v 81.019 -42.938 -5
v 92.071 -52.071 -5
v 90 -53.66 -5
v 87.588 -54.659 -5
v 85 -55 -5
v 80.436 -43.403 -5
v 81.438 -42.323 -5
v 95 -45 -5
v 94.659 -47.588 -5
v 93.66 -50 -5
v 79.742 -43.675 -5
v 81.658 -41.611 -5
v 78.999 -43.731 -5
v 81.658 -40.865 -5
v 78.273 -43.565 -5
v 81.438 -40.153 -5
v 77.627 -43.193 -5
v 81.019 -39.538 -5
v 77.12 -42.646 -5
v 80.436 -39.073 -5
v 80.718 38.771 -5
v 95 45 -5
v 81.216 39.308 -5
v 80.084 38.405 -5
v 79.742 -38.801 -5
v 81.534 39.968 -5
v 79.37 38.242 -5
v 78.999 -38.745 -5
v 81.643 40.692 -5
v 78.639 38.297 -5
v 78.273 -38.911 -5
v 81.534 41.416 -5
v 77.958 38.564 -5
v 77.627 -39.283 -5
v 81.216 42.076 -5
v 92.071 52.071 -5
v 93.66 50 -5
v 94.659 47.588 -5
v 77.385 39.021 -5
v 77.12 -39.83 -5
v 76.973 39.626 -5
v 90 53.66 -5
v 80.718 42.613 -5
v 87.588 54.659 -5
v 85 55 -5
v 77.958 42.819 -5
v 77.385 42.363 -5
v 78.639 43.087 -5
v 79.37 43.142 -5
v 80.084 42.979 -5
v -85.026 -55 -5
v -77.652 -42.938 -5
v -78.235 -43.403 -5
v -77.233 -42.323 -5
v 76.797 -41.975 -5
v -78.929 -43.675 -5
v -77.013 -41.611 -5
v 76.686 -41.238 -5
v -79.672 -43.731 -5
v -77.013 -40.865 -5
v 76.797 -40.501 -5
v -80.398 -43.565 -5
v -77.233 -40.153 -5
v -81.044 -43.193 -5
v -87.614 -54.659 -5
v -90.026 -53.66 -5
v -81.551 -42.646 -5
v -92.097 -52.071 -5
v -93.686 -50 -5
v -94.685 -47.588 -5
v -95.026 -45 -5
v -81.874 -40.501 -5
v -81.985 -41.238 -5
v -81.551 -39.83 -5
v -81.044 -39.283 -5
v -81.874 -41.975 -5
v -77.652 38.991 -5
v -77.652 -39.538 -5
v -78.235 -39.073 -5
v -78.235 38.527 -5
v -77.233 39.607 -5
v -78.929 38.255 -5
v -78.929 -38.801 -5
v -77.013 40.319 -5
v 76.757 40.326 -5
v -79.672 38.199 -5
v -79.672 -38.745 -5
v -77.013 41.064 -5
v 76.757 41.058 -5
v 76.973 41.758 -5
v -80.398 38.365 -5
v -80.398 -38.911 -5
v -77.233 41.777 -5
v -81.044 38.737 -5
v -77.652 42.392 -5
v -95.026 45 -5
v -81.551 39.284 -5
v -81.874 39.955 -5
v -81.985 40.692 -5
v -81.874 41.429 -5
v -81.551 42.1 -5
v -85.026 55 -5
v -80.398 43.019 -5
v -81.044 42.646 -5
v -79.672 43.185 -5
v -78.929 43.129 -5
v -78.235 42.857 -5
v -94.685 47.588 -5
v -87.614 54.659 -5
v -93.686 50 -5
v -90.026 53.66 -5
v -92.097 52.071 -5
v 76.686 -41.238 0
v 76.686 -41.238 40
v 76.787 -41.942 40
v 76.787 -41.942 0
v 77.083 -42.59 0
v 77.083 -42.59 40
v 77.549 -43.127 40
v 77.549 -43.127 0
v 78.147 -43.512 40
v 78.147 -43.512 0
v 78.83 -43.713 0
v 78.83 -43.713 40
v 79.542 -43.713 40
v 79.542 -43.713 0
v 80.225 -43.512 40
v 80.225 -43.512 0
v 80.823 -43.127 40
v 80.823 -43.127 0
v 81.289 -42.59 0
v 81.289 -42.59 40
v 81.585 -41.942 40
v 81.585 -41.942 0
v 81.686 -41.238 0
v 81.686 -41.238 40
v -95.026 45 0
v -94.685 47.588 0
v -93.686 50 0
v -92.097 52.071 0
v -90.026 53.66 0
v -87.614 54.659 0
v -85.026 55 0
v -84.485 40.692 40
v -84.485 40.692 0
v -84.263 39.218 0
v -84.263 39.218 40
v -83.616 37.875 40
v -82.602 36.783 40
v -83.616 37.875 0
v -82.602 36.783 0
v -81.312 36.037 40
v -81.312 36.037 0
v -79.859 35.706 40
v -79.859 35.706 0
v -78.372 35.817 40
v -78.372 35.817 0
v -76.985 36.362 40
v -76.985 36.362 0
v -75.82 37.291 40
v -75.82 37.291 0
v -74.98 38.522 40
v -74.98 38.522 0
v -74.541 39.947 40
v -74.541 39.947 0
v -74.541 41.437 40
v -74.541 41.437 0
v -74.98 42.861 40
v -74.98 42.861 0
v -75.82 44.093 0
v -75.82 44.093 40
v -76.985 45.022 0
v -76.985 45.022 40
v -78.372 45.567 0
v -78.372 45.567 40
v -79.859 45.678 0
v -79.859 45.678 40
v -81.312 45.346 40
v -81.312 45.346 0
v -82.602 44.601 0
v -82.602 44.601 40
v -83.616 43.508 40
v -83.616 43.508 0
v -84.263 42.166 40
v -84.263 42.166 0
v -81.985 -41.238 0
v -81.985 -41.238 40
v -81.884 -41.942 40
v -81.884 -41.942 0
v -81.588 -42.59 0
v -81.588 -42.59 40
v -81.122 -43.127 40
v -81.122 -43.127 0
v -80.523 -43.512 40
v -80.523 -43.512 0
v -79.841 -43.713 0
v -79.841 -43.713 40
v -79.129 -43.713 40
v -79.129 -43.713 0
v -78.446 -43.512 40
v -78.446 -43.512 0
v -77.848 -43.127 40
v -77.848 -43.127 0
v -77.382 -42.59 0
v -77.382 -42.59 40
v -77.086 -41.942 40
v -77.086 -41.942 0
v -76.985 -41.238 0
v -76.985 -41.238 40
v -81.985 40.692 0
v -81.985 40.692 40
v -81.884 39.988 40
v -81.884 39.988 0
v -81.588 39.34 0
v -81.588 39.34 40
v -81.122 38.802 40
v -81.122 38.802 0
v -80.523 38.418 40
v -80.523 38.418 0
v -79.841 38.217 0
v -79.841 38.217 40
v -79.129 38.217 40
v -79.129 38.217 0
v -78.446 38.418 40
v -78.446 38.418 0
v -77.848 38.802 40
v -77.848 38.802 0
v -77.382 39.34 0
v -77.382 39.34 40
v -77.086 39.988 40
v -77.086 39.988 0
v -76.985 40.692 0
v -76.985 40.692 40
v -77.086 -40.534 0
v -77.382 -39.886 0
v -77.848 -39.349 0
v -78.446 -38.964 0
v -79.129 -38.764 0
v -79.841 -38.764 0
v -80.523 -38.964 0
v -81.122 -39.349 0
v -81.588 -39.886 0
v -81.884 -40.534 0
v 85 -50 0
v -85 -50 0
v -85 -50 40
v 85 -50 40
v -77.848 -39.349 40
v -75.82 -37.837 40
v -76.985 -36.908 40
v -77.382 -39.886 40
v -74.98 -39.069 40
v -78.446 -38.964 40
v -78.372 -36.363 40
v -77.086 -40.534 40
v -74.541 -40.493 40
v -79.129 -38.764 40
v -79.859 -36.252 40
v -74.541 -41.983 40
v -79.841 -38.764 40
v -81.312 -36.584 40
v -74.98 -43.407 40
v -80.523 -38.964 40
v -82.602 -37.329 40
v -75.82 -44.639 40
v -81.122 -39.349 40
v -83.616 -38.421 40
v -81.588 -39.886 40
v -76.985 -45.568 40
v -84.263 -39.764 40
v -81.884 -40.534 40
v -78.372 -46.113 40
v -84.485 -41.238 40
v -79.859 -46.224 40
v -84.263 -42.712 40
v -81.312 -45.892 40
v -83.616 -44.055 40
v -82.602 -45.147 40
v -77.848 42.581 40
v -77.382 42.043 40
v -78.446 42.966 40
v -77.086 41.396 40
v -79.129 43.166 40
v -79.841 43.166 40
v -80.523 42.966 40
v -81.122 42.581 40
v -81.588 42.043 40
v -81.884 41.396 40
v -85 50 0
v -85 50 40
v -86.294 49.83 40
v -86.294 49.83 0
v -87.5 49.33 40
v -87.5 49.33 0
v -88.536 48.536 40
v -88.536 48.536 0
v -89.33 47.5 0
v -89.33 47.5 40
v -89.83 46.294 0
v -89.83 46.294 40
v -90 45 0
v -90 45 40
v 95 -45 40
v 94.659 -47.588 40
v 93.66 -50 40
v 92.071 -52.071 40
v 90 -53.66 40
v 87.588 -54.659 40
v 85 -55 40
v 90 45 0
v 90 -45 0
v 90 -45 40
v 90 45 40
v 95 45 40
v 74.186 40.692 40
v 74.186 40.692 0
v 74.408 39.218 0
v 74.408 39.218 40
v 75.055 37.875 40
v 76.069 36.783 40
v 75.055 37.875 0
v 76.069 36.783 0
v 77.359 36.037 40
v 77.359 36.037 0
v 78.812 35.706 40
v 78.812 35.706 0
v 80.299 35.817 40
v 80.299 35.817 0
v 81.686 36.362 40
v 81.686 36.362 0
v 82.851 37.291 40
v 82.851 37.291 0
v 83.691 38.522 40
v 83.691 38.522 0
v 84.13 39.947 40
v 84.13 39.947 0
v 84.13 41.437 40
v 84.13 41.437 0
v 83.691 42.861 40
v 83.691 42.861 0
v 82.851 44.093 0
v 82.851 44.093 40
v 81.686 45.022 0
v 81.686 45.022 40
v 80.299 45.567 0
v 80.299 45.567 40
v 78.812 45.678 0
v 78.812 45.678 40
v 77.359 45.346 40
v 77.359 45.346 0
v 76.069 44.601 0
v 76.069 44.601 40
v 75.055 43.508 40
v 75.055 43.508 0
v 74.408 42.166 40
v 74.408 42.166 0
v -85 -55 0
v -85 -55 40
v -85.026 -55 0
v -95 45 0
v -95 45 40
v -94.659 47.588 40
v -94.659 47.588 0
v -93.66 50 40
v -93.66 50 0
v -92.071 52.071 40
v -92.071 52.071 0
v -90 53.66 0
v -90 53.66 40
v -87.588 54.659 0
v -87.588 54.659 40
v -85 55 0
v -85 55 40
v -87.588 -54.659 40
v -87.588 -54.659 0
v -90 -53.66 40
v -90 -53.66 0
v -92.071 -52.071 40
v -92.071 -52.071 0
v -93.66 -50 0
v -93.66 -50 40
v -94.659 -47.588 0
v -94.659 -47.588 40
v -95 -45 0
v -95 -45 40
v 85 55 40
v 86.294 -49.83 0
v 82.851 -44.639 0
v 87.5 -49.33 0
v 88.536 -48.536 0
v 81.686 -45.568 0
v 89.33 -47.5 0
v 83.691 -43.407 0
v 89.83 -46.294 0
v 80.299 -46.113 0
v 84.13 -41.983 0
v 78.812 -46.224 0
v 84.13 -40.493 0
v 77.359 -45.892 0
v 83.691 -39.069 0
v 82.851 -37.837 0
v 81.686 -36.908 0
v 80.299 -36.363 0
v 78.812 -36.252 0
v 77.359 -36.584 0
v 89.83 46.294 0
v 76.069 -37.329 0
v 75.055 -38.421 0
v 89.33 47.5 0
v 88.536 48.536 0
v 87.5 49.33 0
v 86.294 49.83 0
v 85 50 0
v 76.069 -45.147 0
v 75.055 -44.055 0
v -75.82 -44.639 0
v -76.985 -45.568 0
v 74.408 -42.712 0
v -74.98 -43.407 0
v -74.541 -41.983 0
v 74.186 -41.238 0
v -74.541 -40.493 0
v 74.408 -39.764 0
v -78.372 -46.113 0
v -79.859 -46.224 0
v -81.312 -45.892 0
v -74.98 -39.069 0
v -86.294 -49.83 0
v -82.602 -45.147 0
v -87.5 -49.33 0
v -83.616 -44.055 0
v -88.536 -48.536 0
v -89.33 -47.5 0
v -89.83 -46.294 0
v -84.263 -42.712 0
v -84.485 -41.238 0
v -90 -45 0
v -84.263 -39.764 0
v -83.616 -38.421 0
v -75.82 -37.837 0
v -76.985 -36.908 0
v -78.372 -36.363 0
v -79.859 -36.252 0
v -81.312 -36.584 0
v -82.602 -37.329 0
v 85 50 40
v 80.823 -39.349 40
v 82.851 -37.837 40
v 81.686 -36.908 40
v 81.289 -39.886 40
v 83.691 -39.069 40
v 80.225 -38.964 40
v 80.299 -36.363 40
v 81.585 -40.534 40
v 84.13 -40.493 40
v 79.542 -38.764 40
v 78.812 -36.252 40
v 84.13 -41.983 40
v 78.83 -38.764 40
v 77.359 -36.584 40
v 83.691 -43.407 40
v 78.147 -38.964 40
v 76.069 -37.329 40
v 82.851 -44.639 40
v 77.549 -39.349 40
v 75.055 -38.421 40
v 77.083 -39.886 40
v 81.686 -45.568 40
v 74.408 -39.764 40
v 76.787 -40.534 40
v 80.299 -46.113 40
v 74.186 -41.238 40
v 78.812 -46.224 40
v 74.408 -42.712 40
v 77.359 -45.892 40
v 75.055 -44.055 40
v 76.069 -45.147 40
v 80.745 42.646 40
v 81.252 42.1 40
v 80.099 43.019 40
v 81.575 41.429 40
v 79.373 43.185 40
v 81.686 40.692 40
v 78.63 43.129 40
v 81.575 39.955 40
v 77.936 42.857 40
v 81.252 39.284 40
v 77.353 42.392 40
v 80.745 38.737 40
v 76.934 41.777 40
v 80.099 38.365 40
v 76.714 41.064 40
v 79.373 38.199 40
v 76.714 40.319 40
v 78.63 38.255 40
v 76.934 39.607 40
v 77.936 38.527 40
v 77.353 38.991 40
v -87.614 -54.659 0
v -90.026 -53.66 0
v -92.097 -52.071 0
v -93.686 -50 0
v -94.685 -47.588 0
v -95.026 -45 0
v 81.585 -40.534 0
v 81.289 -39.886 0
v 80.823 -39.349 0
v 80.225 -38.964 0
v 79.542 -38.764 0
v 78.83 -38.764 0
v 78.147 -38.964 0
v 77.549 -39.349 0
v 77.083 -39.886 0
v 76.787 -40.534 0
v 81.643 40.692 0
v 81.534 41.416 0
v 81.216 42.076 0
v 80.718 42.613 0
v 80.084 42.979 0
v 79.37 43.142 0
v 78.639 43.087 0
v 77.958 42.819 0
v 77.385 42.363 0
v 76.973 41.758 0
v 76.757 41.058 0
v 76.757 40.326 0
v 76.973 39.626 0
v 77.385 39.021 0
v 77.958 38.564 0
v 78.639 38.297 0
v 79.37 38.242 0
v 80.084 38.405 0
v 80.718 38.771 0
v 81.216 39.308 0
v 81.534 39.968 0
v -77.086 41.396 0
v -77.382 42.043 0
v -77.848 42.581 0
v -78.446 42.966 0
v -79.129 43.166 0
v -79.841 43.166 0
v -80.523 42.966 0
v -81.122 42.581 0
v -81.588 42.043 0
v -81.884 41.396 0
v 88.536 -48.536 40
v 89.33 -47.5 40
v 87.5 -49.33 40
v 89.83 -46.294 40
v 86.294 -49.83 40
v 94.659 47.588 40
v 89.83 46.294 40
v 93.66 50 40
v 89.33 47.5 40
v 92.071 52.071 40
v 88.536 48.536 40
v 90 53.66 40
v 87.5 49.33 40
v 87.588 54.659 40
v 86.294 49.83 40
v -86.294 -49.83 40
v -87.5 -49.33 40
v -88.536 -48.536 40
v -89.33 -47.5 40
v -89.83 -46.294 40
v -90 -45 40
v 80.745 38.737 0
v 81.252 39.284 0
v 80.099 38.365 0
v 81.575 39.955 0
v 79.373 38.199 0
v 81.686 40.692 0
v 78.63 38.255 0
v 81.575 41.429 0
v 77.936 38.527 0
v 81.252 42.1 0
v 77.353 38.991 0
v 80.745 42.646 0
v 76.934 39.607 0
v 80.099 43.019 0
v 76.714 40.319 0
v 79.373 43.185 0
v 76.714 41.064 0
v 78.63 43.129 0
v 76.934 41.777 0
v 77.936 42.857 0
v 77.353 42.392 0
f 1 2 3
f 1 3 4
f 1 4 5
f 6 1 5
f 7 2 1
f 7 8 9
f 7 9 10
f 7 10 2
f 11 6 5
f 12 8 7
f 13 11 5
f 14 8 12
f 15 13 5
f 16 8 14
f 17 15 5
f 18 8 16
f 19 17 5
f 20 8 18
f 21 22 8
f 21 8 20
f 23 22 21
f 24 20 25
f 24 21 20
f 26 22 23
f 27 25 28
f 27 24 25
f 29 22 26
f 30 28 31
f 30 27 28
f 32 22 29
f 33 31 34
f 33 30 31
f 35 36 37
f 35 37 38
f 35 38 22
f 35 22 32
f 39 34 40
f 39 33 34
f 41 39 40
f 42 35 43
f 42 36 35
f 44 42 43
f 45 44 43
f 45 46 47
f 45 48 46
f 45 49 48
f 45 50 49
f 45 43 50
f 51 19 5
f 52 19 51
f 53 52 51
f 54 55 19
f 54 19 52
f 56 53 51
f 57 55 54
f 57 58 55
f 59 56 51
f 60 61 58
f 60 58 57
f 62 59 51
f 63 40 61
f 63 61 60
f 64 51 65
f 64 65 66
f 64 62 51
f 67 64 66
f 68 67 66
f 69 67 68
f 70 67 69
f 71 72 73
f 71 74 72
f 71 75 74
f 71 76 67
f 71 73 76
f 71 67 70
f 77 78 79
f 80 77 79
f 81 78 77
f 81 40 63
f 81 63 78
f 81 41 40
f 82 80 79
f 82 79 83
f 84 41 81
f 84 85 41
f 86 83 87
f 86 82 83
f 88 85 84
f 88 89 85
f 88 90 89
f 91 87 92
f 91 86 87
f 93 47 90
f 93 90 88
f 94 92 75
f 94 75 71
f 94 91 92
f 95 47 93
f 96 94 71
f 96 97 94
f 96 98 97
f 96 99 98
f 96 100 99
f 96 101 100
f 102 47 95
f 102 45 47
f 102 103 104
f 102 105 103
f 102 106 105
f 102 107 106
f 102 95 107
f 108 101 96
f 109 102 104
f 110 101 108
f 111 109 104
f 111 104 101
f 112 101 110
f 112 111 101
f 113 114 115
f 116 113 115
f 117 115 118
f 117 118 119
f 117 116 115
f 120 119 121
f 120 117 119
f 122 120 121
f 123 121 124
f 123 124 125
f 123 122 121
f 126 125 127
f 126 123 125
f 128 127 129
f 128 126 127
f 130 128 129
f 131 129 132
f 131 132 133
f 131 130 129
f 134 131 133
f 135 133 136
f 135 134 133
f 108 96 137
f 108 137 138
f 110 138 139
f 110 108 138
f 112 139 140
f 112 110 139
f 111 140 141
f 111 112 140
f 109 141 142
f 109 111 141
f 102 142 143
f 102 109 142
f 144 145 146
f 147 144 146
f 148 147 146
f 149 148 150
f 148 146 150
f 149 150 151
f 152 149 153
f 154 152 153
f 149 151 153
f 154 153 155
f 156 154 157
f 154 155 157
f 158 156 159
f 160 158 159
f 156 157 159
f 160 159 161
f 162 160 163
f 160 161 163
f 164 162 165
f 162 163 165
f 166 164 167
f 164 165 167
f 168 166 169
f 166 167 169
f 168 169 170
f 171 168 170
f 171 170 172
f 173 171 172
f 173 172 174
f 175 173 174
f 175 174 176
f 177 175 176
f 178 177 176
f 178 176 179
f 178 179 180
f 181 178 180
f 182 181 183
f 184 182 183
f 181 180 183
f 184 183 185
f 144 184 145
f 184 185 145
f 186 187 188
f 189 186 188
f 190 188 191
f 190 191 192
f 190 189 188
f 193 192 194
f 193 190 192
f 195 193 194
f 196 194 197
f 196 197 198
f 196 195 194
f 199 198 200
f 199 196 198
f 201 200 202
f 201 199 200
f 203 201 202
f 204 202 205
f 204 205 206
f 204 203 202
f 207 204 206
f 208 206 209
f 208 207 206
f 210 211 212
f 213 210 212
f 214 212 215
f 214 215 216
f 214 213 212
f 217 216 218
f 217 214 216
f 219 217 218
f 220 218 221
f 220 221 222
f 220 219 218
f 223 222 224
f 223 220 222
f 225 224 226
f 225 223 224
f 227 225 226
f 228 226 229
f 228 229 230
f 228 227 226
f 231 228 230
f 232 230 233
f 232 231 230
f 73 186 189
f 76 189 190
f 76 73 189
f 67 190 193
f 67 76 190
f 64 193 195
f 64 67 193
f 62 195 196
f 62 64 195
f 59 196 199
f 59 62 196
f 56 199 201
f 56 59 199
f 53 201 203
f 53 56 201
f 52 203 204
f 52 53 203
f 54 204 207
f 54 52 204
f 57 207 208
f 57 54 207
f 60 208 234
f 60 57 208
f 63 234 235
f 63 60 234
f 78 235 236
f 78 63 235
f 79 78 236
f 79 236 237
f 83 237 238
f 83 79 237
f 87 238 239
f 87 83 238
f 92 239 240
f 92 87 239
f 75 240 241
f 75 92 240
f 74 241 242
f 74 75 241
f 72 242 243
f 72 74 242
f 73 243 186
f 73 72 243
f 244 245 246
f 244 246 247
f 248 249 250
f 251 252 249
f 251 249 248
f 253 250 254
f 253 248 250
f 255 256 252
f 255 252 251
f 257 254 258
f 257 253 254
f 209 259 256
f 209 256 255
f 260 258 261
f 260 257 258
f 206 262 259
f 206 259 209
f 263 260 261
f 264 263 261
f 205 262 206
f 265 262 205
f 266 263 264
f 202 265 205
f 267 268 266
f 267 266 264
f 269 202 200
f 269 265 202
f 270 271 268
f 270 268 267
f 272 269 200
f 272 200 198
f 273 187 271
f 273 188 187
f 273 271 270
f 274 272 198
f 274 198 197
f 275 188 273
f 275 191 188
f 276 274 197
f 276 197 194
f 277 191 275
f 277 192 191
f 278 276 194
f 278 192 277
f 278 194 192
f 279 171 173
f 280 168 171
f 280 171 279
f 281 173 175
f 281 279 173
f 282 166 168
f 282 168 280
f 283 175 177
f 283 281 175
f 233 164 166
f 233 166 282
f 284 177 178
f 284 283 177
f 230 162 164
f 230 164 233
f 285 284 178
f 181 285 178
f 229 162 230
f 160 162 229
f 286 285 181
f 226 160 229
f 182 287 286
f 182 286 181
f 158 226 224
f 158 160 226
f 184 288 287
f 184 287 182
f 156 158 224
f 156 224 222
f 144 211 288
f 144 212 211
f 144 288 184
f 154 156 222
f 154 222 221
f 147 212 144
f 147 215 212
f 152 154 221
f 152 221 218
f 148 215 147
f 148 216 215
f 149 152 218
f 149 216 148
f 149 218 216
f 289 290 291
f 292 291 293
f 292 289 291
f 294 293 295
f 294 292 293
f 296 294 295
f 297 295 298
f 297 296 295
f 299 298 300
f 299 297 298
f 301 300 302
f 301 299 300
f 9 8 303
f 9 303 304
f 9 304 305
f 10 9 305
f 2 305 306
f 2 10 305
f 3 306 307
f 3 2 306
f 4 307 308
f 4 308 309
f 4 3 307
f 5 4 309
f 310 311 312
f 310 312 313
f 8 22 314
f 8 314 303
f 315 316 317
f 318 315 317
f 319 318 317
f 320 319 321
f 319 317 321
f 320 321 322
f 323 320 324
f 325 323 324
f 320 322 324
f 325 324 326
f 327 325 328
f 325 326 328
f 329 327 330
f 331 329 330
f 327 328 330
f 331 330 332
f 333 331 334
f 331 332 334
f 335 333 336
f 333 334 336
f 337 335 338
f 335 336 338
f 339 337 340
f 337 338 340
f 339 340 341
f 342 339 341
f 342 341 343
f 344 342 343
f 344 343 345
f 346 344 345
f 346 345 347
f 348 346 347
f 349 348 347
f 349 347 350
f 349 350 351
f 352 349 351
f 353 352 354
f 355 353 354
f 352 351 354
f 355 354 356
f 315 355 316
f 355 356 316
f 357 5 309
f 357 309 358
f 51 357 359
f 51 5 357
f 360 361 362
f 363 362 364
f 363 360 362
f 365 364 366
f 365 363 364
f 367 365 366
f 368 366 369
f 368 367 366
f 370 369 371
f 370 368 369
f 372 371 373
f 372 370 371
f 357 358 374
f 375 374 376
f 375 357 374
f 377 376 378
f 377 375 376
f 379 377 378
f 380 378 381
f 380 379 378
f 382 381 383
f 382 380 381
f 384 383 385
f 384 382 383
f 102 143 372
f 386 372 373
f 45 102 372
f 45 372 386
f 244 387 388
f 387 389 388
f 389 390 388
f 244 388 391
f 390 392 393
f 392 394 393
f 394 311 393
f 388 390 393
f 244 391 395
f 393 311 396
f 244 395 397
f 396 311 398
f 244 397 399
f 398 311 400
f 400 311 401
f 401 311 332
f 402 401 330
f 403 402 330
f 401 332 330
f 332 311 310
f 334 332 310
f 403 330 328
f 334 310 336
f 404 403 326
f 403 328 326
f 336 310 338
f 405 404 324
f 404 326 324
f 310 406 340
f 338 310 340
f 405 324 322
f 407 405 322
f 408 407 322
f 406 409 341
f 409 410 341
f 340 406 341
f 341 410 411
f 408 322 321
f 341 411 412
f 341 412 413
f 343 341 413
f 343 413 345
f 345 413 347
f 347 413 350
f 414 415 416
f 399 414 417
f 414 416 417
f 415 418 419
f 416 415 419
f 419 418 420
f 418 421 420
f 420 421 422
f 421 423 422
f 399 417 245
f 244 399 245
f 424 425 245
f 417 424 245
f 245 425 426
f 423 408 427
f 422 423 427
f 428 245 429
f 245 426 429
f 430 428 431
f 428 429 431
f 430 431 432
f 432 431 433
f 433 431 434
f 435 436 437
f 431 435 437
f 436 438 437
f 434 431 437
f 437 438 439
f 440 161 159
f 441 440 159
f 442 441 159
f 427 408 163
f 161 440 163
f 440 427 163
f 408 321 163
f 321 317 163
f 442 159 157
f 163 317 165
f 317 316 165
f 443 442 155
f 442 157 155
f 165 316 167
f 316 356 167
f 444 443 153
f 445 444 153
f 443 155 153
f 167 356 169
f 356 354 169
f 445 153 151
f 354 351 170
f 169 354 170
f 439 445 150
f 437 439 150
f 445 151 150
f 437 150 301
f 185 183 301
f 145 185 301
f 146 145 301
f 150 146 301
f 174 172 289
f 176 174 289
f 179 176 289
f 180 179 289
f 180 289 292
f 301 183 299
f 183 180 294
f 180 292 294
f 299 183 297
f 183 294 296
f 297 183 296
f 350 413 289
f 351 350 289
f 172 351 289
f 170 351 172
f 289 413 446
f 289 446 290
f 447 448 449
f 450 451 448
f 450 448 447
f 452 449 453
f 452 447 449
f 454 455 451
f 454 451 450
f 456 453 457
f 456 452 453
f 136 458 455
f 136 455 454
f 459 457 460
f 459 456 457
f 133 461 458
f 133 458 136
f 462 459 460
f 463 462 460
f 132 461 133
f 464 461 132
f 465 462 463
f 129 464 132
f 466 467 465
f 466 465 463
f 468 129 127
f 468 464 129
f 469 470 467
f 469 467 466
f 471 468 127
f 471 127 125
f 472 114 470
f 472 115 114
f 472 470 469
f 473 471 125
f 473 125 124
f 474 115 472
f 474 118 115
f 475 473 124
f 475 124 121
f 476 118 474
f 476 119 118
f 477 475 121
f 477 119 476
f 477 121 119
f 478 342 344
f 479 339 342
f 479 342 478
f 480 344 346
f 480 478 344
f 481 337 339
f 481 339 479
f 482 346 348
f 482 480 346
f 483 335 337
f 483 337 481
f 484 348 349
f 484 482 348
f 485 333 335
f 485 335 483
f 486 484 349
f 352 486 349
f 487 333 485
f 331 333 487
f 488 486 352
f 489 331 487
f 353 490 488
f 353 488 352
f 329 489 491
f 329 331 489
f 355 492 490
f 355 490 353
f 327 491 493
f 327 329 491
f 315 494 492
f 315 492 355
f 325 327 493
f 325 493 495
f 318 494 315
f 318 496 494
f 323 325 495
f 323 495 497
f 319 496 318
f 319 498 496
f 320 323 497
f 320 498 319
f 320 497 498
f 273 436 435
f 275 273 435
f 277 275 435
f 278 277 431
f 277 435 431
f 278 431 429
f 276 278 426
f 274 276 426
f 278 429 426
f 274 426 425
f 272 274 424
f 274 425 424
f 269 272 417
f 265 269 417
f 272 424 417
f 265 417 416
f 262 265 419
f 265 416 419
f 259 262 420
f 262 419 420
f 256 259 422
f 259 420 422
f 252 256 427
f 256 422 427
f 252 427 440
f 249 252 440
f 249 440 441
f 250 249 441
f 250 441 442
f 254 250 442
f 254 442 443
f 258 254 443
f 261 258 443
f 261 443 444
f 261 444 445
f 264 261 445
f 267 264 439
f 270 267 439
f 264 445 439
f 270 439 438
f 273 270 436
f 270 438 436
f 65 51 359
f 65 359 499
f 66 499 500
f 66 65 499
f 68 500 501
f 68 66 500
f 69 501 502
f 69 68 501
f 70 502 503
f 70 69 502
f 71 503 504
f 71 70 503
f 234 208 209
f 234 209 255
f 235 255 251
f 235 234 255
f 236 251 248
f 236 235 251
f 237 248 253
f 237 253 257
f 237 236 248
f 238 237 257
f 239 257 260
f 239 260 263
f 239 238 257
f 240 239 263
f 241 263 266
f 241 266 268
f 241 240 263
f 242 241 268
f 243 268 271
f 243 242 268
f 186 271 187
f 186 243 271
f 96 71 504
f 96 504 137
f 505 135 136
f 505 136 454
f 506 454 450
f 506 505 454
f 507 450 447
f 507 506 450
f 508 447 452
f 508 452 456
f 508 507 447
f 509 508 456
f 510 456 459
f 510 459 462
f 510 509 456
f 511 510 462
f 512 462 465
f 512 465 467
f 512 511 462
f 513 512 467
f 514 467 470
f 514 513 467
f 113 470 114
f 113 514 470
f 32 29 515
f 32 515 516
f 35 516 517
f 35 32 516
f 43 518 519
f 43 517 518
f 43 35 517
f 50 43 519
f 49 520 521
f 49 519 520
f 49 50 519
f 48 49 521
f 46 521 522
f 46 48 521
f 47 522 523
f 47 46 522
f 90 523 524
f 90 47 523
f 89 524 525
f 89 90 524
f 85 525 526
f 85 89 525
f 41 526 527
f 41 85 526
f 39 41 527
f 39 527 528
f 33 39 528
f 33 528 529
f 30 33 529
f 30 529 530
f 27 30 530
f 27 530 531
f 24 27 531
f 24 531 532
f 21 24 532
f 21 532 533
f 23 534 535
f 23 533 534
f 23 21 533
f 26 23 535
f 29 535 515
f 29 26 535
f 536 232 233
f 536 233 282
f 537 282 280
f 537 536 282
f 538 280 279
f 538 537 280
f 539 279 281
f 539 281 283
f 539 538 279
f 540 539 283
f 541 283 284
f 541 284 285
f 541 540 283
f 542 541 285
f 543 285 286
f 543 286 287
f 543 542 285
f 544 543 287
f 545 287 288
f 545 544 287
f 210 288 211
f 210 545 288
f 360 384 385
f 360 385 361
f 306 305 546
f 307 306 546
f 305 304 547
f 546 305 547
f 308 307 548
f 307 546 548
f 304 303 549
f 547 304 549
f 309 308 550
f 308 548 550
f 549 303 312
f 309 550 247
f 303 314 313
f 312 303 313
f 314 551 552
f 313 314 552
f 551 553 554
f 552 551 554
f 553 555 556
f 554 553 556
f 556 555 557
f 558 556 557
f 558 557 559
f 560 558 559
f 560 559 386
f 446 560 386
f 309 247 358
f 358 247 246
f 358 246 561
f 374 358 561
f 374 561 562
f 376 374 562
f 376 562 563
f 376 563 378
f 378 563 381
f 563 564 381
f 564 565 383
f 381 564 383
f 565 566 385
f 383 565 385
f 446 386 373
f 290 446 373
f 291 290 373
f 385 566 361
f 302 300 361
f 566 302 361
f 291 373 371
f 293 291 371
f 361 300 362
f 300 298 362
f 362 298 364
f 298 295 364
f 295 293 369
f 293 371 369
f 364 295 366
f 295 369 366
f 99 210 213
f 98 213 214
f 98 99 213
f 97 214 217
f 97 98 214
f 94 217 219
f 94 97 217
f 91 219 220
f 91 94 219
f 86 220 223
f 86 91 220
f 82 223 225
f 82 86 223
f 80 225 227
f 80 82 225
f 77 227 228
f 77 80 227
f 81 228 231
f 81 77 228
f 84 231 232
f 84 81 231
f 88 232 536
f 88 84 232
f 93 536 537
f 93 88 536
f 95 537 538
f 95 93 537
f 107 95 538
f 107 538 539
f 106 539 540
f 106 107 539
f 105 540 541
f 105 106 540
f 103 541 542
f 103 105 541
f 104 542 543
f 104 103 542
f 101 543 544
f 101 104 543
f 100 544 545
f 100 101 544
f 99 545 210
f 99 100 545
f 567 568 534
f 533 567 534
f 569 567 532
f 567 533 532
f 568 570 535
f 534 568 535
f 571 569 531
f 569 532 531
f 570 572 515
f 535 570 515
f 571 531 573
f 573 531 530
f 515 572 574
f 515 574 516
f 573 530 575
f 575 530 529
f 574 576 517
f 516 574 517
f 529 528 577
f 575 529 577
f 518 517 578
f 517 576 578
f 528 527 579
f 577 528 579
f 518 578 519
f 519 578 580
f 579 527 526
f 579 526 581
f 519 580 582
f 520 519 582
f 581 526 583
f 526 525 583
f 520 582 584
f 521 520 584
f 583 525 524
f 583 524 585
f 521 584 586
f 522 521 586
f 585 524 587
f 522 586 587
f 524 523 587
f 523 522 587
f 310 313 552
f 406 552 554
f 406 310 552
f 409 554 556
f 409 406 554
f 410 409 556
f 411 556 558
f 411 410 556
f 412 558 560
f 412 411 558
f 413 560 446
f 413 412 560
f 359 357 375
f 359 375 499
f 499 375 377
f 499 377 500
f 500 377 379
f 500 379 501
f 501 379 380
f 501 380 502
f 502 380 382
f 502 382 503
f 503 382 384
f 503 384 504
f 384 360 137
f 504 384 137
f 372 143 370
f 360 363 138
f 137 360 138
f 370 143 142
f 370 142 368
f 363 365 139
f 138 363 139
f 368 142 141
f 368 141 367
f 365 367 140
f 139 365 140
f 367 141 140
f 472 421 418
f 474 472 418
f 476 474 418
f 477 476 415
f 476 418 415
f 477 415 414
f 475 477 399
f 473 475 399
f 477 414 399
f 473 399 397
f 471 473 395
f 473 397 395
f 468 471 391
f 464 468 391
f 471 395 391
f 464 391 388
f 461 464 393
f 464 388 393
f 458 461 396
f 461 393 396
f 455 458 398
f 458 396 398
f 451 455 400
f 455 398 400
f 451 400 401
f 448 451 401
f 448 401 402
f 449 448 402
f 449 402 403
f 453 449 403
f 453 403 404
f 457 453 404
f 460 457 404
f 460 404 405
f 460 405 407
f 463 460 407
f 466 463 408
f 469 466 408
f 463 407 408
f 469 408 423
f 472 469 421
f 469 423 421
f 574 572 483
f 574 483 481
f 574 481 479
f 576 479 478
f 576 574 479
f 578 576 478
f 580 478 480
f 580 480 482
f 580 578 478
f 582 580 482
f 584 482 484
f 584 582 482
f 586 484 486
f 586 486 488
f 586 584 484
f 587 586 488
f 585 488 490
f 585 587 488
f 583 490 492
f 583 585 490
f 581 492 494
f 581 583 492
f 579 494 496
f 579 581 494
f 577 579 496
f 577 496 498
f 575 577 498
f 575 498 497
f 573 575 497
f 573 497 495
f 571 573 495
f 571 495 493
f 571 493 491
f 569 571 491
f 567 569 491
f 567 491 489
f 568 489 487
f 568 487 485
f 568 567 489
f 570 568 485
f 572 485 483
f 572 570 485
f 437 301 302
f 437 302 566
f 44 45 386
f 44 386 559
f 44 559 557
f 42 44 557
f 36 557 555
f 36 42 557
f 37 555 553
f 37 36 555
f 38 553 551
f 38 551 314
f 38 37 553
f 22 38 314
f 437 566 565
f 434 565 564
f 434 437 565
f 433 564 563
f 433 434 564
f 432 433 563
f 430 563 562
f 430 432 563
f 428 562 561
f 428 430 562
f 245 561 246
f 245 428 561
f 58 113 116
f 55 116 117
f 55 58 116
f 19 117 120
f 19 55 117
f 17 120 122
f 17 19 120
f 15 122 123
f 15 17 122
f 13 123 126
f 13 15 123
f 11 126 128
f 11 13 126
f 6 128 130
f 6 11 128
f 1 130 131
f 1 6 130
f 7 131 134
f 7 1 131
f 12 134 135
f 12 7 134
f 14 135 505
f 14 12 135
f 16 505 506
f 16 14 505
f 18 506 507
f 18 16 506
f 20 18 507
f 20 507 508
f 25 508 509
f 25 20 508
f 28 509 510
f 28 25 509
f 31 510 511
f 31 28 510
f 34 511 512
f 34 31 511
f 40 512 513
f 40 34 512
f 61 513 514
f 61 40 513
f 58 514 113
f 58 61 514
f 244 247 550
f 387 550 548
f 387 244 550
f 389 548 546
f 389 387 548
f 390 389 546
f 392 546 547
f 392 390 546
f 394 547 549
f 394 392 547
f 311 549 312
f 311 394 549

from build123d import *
from build123d.topology import SkipClean

# Parameters (mm, degrees)
BOSS_EXTRUDE1_DEPTH = 40
BOSS_EXTRUDE2_START = 5
BOSS_EXTRUDE2_DEPTH = 5
SKETCH4_R           = 5
SKETCH4_R_2         = 2.5
BOSS_EXTRUDE3_DEPTH = 40
CUT_EXTRUDE2_START  = -60
SKETCH5_R           = 2.5
SKETCH5_R_2         = 2.456644978
CUT_EXTRUDE2_DEPTH  = 60


with BuildPart() as part:
    # Sketch1 → Boss-Extrude1 (new body)
    with BuildSketch(Plane.XY):
        with BuildLine():
            Line((-95, -45), (-95, 45))
            ThreePointArc((-95, 45), (-92.071067812, 52.071067812), (-85, 55))
            Line((-85, 55), (85, 55))
            ThreePointArc((85, 55), (92.071067812, 52.071067812), (95, 45))
            Line((95, 45), (95, -45))
            ThreePointArc((95, -45), (92.071067812, -52.071067812), (85, -55))
            Line((85, -55), (-85, -55))
            ThreePointArc((-85, -55), (-92.071067812, -52.071067812), (-95, -45))
        make_face()
        with BuildLine():
            Line((-85, -50), (85, -50))
            ThreePointArc((85, -50), (88.535533906, -48.535533906), (90, -45))
            Line((90, -45), (90, 45))
            ThreePointArc((90, 45), (88.535533906, 48.535533906), (85, 50))
            Line((85, 50), (-85, 50))
            ThreePointArc((-85, 50), (-88.535533906, 48.535533906), (-90, 45))
            Line((-90, 45), (-90, -45))
            ThreePointArc((-90, -45), (-88.535533906, -48.535533906), (-85, -50))
        make_face(mode=Mode.SUBTRACT)
    extrude(amount=BOSS_EXTRUDE1_DEPTH)

    # Sketch3 → Boss-Extrude2 (add)
    with BuildSketch(Plane(origin=(0, 0, 0), x_dir=(-1, 0, 0), z_dir=(0, 0, -1)).offset(BOSS_EXTRUDE2_START)):
        with BuildLine():
            Line((-85, -55), (85.025805787, -55))
            ThreePointArc((85.025805787, -55), (92.096873598, -52.071067812), (95.025805787, -45))
            Line((95.025805787, -45), (95.025805787, 45))
            ThreePointArc((95.025805787, 45), (92.096873598, 52.071067812), (85.025805787, 55))
            Line((85.025805787, 55), (-85, 55))
            ThreePointArc((-85, 55), (-92.071067812, 52.071067812), (-95, 45))
            Line((-95, 45), (-95, -45))
            ThreePointArc((-95, -45), (-92.071067812, -52.071067812), (-85, -55))
        make_face()
    extrude(amount=-BOSS_EXTRUDE2_DEPTH)

    # Sketch4 → Boss-Extrude3 (add)
    # profile 1 of 4: a face of its own
    with BuildSketch(Plane.XY):
        with Locations(Location((-79.484929462, 40.691862401, 0), (0, 0, 180))):
            Circle(SKETCH4_R)
        with Locations((-79.484929462, 40.691862401)):
            Circle(SKETCH4_R_2, mode=Mode.SUBTRACT)
    # profile 2 of 4: a face of its own
    with BuildSketch(Plane.XY):
        with Locations(Location((-79.484929462, -41.238061896, 0), (0, 0, 180))):
            Circle(SKETCH4_R)
        with Locations((-79.484929462, -41.238061896)):
            Circle(SKETCH4_R_2, mode=Mode.SUBTRACT)
    # profile 3 of 4: a face of its own
    with BuildSketch(Plane.XY):
        with Locations(Location((79.186023927, -41.238061896, 0), (0, 0, 180))):
            Circle(SKETCH4_R)
        with Locations((79.186023927, -41.238061896)):
            Circle(SKETCH4_R_2, mode=Mode.SUBTRACT)
    # profile 4 of 4: a face of its own
    with BuildSketch(Plane.XY):
        with Locations(Location((79.186023927, 40.691862401, 0), (0, 0, 180))):
            Circle(SKETCH4_R)
        with Locations((79.186023927, 40.691862401)):
            Circle(SKETCH4_R_2, mode=Mode.SUBTRACT)
    extrude(amount=BOSS_EXTRUDE3_DEPTH)

    # Sketch5 → Cut-Extrude2 (cut)
    with SkipClean():  # the faces are left unmerged after this step: merging them gives an invalid solid
        with BuildSketch(Plane.XY.offset(40).offset(CUT_EXTRUDE2_START)):
            with Locations(Location((-79.484929462, 40.691862401, 0), (0, 0, 180))):
                Circle(SKETCH5_R)
            with Locations((79.186023927, 40.691862401)):
                Circle(SKETCH5_R_2)
            with Locations(Location((-79.484929462, -41.238061896, 0), (0, 0, 180))):
                Circle(SKETCH5_R)
            with Locations(Location((79.186023927, -41.238061896, 0), (0, 0, 180))):
                Circle(SKETCH5_R)
        extrude(amount=CUT_EXTRUDE2_DEPTH, mode=Mode.SUBTRACT)


solid = part.part
